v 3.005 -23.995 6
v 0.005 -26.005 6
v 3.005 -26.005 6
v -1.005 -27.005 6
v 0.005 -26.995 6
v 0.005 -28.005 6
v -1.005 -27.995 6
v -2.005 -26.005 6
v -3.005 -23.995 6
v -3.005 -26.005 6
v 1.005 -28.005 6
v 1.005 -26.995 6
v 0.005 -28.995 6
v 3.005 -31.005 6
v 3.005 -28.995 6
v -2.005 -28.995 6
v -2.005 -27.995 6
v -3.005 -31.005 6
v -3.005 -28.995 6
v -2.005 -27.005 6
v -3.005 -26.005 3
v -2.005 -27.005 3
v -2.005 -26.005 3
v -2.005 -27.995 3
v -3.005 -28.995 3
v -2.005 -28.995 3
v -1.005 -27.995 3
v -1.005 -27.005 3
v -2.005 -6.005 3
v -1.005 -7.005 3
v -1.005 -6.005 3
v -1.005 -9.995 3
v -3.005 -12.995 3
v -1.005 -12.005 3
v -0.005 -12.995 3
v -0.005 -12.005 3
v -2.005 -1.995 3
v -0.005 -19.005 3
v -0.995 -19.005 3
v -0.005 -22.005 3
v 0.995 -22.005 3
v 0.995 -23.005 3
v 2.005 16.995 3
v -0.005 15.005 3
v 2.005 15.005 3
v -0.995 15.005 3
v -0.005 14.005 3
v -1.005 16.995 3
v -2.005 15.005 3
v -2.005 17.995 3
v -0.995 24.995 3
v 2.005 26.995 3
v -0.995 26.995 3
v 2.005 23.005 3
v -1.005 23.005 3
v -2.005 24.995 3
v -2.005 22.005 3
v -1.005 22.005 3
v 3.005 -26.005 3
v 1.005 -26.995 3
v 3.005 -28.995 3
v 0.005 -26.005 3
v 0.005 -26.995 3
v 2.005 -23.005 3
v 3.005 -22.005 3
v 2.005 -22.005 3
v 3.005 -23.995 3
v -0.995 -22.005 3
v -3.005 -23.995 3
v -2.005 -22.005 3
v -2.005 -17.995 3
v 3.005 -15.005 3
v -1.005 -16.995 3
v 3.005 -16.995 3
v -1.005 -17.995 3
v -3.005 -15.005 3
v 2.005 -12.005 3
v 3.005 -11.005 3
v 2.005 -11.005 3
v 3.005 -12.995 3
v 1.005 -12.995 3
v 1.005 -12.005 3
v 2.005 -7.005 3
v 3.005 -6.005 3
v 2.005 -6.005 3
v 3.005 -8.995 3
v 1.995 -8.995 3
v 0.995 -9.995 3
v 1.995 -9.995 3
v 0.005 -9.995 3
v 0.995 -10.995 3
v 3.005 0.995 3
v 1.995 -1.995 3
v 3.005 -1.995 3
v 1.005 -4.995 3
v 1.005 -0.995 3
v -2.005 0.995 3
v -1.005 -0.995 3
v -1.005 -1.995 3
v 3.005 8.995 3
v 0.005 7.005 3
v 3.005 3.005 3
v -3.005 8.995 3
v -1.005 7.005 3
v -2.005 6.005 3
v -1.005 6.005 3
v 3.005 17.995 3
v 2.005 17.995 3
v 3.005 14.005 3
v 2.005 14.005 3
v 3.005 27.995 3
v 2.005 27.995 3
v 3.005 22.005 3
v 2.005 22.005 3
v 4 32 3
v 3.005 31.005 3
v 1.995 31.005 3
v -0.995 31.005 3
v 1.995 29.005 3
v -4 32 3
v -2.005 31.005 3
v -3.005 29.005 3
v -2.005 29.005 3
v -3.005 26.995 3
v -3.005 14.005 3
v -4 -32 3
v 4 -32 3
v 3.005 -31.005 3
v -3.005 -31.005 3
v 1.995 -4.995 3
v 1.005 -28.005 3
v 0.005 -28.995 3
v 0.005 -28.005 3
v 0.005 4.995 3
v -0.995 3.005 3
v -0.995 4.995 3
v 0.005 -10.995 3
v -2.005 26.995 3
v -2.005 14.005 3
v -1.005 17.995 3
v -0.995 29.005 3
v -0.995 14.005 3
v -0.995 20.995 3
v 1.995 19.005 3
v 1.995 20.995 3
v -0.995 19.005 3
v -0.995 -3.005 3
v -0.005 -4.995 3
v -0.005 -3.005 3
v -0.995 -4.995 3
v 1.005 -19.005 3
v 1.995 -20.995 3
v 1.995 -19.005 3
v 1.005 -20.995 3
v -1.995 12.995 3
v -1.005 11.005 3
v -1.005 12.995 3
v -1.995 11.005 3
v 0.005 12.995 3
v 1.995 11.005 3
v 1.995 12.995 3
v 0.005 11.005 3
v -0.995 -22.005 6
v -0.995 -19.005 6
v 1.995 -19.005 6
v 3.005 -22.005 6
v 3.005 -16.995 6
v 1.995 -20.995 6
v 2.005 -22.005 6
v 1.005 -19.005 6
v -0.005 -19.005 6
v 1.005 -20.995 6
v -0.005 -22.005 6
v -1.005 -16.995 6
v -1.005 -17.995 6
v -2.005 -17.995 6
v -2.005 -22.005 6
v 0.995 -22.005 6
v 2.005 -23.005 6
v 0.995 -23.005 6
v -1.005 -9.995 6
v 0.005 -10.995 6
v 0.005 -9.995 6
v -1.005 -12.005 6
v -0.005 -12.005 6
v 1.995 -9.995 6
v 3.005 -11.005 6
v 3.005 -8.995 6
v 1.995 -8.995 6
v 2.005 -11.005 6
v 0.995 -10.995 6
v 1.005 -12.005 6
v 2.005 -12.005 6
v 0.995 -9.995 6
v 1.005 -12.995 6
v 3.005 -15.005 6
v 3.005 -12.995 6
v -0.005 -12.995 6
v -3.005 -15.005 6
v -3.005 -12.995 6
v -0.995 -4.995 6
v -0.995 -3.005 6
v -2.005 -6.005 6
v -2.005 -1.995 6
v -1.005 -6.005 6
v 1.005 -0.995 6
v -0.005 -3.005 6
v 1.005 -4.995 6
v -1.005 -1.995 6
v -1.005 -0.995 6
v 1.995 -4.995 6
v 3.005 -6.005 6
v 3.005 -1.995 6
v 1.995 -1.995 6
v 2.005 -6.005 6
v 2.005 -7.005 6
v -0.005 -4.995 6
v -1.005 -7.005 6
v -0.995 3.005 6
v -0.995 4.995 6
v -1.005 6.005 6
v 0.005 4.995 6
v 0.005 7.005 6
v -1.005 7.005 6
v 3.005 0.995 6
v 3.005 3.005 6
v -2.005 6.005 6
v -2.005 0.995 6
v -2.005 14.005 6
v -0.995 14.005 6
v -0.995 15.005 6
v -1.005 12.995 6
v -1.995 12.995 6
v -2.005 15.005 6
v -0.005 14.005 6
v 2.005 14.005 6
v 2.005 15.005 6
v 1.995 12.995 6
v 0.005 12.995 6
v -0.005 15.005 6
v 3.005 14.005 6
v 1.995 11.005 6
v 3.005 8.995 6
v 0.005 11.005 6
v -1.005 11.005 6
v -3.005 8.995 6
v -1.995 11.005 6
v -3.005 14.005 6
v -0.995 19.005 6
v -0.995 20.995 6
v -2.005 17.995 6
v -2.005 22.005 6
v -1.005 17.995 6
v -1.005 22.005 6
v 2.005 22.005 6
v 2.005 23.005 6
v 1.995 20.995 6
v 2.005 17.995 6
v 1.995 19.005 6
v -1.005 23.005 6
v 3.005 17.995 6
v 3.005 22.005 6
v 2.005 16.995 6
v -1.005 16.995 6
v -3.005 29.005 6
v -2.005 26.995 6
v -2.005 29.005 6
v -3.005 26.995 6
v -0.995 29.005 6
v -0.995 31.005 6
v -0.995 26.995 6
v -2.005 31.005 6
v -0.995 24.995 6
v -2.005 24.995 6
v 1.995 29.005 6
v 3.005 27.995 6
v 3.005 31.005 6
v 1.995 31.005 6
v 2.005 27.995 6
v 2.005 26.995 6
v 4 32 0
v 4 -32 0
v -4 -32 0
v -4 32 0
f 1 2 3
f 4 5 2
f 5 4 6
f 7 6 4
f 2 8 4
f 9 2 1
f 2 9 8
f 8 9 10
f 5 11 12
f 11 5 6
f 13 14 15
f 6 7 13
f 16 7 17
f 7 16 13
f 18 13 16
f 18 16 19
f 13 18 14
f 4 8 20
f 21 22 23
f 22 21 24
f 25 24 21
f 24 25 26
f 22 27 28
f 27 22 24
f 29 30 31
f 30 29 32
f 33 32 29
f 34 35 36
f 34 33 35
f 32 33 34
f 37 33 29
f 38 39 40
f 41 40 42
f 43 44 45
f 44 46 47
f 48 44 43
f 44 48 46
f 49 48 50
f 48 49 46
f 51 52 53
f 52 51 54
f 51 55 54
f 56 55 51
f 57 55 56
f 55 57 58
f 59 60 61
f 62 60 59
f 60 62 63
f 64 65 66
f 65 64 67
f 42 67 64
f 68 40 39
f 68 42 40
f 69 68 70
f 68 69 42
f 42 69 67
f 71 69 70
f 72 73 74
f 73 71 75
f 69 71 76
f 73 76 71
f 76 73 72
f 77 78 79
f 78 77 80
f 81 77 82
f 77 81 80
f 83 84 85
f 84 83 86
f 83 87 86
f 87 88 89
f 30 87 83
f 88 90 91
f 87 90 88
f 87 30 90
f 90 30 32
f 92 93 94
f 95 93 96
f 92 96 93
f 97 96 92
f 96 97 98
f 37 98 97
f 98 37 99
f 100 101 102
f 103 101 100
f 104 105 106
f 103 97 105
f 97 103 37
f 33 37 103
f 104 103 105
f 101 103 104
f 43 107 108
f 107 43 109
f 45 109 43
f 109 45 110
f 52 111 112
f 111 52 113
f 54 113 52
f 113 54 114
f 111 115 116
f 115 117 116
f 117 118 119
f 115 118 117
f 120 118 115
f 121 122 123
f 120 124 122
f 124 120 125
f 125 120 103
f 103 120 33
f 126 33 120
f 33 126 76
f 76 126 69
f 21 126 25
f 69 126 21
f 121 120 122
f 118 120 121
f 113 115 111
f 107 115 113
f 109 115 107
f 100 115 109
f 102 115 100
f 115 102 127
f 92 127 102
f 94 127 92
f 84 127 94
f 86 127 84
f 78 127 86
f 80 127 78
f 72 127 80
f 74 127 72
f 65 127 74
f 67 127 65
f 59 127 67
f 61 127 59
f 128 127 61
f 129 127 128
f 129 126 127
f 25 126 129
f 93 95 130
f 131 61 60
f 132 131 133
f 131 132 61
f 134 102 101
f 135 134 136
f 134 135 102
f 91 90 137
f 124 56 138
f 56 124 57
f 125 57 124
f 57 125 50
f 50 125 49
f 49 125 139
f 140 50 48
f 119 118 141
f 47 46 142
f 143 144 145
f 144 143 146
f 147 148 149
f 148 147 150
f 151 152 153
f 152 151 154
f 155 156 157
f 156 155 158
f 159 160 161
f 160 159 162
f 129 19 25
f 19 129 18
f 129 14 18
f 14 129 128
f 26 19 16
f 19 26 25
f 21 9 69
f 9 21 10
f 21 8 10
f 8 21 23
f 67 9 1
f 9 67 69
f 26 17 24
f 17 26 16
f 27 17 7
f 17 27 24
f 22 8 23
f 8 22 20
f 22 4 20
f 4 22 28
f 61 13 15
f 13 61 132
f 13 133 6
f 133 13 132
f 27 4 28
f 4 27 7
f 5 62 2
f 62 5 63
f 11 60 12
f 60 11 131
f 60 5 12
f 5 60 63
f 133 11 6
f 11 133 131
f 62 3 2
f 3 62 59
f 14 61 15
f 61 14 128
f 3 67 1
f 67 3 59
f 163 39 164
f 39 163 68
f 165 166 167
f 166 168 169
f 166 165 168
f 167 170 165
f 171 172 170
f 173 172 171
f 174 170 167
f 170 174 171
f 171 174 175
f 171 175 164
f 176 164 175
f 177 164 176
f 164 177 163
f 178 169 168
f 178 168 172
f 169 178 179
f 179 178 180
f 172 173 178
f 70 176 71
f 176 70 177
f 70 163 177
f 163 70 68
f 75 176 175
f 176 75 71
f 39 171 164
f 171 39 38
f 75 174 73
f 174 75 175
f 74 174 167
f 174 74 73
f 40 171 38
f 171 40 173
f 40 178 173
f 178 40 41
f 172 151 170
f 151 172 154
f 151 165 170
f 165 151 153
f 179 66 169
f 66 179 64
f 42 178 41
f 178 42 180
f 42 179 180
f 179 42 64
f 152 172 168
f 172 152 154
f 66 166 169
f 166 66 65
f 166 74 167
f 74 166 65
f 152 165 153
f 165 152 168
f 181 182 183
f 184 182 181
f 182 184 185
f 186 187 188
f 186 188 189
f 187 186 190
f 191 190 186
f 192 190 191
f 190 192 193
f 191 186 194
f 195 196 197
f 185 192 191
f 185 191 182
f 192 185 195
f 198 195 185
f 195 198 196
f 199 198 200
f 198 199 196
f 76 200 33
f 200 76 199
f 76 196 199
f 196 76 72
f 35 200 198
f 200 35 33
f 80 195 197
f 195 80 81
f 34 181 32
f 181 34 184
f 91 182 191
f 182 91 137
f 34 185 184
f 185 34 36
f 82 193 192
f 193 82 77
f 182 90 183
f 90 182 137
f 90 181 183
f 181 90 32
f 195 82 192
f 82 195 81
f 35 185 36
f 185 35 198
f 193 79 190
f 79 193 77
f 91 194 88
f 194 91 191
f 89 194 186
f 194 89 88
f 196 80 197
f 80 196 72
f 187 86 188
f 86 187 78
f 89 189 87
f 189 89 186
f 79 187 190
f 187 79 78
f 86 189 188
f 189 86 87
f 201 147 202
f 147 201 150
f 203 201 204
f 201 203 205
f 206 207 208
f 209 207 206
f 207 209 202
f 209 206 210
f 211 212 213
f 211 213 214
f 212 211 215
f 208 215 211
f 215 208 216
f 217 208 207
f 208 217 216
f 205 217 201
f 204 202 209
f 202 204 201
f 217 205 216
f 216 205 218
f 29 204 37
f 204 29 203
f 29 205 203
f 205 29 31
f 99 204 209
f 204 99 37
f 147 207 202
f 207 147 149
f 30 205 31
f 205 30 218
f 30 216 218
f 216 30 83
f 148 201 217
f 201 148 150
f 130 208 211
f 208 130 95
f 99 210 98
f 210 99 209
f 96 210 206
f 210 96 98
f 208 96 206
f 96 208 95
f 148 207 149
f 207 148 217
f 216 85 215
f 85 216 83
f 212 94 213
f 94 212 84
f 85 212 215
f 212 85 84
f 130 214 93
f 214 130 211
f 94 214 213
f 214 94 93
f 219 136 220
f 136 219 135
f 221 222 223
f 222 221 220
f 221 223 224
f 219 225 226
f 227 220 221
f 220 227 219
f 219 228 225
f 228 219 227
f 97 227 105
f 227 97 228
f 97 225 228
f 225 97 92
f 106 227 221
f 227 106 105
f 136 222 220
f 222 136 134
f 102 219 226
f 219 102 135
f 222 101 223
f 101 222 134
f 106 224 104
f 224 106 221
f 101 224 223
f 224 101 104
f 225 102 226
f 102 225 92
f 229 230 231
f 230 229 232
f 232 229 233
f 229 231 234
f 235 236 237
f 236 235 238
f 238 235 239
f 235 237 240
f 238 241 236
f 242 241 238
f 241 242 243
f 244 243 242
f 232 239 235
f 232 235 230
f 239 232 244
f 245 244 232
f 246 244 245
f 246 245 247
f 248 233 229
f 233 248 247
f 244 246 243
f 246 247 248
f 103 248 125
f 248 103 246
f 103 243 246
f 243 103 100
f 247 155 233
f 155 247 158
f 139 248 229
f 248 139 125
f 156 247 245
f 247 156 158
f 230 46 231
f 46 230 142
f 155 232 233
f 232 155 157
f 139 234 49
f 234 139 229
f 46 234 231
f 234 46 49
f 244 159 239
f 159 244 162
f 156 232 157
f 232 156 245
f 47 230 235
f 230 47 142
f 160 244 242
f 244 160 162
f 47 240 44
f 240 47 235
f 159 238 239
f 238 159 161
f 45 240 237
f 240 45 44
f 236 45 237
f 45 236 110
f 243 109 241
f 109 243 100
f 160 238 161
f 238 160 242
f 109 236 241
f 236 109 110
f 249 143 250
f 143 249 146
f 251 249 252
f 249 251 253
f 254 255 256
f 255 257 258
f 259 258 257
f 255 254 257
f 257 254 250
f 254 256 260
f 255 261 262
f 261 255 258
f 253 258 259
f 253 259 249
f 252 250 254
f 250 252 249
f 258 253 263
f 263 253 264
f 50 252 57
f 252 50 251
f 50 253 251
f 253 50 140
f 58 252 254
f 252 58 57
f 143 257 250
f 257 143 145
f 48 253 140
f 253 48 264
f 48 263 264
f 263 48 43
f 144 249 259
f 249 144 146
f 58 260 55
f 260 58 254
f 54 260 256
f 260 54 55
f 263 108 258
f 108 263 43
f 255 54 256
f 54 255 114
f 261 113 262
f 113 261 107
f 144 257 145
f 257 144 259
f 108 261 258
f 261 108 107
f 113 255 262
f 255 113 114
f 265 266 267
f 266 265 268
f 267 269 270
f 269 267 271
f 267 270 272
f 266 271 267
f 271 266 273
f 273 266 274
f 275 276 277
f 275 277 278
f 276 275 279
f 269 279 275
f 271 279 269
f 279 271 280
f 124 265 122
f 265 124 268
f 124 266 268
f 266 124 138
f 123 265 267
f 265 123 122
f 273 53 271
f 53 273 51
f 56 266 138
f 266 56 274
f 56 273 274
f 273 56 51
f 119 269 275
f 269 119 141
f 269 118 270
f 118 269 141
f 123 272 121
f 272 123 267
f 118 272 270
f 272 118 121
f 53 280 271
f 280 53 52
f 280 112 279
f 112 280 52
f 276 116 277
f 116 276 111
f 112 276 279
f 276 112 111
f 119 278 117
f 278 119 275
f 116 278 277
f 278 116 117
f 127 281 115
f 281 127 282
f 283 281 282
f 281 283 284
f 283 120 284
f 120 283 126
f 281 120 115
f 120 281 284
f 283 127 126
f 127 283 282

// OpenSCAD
/*
Parametric Name Tag 
Tony Buser <tbuser@gmail.com>
http://tonybuser.com
http://creativecommons.org/licenses/by/3.0/
*/

include <bitmap.scad>

// change chars array and char_count
// OpenSCAD has no string or length methods :(
chars = ["M","a","k","e","r","B","o","t"];
char_count = 8;

// block size 1 will result in 8mm per letter
block_size = 1;
// height is the Z height of each letter
height = 3;

union() {
	translate(v = [0,-block_size*8*char_count/2+block_size*8/2,3]) {
		8bit_str(chars, char_count, block_size, height);
	}
	translate(v = [0,0,3/2]) {
		color([0,0,1,1]) {
			cube(size = [block_size * 8, block_size * 8 * char_count, 3], center = true);
		}
	}
}
